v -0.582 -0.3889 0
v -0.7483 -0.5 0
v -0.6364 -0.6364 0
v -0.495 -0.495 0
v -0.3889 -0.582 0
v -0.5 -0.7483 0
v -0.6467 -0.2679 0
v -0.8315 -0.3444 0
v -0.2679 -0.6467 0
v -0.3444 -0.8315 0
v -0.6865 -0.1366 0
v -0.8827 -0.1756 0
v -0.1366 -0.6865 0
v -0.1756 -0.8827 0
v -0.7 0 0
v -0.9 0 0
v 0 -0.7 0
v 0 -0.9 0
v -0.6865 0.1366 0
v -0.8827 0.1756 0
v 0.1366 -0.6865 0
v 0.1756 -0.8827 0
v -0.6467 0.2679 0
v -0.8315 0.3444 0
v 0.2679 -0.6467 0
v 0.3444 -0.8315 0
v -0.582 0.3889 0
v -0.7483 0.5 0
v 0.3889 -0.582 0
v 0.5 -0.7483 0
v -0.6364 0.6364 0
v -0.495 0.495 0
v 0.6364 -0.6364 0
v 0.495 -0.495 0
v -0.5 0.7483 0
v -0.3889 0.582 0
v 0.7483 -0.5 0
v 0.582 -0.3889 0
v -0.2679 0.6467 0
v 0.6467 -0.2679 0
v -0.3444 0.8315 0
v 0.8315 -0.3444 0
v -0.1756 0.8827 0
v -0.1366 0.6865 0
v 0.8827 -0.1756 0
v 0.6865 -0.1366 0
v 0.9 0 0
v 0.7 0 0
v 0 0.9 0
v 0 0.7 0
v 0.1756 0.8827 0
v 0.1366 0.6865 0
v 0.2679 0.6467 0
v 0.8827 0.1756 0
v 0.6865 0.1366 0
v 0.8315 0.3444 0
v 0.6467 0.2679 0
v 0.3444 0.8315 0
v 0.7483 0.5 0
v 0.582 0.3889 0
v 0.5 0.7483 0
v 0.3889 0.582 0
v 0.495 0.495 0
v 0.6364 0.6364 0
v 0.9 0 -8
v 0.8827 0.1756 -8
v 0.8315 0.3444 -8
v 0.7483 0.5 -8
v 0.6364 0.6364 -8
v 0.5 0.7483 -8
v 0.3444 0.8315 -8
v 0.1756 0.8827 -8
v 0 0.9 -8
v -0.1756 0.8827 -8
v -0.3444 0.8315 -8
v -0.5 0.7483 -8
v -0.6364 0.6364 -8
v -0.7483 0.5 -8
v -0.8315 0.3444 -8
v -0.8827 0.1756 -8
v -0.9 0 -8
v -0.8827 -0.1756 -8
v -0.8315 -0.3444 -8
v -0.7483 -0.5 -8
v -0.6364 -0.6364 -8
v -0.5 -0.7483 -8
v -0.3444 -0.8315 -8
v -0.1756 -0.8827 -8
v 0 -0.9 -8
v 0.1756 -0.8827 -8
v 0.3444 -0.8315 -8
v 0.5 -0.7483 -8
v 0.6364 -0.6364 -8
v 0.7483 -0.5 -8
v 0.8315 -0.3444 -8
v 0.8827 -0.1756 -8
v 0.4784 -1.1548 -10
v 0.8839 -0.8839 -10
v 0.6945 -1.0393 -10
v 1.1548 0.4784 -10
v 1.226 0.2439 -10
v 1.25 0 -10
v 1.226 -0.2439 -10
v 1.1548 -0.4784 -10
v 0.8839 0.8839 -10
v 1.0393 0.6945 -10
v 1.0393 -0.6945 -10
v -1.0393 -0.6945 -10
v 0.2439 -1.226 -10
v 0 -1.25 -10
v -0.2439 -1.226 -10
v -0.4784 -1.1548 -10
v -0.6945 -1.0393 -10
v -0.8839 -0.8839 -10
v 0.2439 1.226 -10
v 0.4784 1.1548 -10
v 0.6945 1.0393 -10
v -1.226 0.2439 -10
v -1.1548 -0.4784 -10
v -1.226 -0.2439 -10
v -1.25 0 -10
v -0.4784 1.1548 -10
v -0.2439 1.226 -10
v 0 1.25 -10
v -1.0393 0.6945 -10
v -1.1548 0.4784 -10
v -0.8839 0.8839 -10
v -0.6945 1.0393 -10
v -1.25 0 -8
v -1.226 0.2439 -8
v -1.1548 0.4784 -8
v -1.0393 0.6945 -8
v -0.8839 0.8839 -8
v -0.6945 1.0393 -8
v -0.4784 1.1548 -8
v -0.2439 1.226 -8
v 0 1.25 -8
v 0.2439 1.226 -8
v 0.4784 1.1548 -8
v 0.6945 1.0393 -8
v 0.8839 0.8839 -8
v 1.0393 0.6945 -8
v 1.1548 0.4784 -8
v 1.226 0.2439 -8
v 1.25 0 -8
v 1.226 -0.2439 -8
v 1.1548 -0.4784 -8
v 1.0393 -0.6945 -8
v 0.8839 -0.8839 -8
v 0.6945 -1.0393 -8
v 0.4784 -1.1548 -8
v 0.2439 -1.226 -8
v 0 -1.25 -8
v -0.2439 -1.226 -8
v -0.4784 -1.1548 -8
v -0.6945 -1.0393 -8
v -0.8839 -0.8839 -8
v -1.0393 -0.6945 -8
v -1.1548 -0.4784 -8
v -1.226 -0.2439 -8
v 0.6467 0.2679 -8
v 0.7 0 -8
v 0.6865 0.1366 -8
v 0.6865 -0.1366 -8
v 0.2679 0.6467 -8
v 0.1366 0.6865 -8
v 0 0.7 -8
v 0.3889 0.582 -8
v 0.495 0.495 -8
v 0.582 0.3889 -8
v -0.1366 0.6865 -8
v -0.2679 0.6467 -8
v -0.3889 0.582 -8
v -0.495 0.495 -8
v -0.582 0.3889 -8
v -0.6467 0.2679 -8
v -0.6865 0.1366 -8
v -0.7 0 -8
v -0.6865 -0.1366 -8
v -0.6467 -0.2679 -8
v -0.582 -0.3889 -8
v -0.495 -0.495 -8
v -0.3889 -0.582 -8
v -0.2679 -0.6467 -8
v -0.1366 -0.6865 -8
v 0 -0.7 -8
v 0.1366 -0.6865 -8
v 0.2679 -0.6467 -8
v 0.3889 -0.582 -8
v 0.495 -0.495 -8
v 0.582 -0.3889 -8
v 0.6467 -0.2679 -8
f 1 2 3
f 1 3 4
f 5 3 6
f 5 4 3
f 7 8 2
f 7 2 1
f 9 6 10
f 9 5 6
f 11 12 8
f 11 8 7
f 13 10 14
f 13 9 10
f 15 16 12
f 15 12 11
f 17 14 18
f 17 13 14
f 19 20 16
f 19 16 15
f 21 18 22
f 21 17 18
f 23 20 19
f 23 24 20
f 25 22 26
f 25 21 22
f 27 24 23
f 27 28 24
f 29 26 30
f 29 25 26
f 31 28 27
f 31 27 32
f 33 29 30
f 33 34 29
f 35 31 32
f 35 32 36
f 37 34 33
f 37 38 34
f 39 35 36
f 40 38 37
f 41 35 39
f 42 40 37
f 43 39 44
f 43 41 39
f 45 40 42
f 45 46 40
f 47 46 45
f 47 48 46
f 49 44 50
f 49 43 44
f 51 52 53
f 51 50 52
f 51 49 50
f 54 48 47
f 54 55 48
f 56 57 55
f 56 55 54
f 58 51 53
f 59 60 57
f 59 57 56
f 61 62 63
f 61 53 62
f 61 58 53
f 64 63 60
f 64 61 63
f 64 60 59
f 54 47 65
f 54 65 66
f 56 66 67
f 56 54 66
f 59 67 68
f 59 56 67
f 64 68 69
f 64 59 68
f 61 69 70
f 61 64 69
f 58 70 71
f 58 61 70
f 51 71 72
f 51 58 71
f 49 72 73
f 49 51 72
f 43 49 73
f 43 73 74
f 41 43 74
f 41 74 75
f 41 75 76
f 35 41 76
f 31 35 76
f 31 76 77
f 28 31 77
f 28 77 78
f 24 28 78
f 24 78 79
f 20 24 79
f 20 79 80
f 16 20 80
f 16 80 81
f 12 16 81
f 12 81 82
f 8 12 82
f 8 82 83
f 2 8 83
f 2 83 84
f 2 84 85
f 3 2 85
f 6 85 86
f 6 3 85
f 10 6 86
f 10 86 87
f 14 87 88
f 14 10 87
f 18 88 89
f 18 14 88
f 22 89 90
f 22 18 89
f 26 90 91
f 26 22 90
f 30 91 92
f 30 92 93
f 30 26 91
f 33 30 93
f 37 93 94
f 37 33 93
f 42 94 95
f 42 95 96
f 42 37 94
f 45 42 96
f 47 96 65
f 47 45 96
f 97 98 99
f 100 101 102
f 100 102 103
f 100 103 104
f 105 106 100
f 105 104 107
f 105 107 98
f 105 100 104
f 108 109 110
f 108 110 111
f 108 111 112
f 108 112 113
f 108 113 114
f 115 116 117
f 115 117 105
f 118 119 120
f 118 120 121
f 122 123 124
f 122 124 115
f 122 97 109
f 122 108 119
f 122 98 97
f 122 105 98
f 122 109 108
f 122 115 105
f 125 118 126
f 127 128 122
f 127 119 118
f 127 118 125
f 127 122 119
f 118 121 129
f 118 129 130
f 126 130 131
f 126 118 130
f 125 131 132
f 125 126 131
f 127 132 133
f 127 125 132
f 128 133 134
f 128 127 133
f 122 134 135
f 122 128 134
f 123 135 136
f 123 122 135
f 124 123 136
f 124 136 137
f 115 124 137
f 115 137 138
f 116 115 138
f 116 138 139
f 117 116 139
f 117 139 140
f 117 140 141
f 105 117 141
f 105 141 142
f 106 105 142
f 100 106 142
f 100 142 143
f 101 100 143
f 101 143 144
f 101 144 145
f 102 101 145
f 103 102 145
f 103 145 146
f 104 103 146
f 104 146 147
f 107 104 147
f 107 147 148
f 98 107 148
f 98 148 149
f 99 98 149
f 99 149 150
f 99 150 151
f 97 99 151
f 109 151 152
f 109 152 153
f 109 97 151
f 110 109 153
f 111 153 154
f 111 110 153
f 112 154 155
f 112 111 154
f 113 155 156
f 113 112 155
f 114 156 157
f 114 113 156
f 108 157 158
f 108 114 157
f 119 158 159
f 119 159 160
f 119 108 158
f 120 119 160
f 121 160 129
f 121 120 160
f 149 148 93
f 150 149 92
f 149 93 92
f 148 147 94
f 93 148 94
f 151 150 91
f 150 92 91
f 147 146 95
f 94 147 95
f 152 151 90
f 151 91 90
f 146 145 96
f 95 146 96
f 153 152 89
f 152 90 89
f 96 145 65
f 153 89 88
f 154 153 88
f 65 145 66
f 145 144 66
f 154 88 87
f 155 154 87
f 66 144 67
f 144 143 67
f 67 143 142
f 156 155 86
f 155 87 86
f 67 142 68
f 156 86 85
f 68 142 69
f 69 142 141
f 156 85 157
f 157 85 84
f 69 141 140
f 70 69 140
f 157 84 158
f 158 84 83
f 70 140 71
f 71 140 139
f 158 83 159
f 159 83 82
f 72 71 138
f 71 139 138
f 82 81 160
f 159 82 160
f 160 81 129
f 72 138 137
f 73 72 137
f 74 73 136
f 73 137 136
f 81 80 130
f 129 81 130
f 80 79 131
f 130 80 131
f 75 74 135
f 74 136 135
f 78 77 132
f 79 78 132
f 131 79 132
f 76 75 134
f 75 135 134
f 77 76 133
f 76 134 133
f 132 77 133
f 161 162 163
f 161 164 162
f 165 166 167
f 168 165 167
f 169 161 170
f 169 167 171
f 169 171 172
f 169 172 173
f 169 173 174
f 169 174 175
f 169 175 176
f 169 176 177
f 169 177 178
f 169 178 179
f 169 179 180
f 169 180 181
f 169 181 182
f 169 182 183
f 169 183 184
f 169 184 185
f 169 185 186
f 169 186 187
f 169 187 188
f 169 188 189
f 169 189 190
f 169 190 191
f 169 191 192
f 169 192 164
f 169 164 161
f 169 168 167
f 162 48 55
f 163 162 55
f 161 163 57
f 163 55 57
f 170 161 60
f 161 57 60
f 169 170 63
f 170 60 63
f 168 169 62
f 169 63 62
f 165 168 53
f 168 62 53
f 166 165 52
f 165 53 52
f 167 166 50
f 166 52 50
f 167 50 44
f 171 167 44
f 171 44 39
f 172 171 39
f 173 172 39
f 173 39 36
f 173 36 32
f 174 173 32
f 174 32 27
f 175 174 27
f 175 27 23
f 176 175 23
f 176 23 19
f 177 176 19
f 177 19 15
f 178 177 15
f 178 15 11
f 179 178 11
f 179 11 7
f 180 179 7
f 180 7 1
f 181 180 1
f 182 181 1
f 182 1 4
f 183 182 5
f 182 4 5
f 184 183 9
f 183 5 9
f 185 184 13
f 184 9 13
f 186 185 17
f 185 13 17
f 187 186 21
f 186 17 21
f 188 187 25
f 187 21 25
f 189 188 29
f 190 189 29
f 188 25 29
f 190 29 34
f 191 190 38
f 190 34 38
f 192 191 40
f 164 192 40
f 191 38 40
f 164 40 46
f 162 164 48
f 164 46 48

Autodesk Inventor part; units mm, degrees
ref_plane "YZ Plane" through (0, 0, 0) normal (1, 0, 0) x (0, 1, 0)
ref_plane "XZ Plane" through (0, 0, 0) normal (0, 1, 0) x (-1, 0, 0)
ref_plane "XY Plane" through (0, 0, 0) normal (0, 0, 1) x (1, 0, 0)
sketch "Esboço1" plane through (0, 0, 0) normal (0, 0, 1) x (1, 0, 0)
  circle A0 centre (0, 0) radius 0.9
  dimension "d0" = 1.8
extrude "Extrusão1" add sketch "Esboço1" against normal blind 10
sketch "Esboço2" plane through (0, 0, -10) normal (0, 0, -1) x (-1, 0, 0)
  circle A0 centre (0, 0) radius 1.25
  dimension "d3" = 2.5
extrude "Extrusão2" add sketch "Esboço2" against normal blind 2
sketch "Esboço3" plane through (0, 0, 0) normal (0, 0, 1) x (1, 0, 0)
  circle A0 centre (0, 0) radius 0.7
  dimension "d6" = 1.4
extrude "Extrusão3" cut sketch "Esboço3" against normal blind 8
thread "Rosca1" size "M1.4x0.3" class "6H" standard "ANSI Metric M Profile" full length
properties material "Liga de Nickel-Copper 400"
